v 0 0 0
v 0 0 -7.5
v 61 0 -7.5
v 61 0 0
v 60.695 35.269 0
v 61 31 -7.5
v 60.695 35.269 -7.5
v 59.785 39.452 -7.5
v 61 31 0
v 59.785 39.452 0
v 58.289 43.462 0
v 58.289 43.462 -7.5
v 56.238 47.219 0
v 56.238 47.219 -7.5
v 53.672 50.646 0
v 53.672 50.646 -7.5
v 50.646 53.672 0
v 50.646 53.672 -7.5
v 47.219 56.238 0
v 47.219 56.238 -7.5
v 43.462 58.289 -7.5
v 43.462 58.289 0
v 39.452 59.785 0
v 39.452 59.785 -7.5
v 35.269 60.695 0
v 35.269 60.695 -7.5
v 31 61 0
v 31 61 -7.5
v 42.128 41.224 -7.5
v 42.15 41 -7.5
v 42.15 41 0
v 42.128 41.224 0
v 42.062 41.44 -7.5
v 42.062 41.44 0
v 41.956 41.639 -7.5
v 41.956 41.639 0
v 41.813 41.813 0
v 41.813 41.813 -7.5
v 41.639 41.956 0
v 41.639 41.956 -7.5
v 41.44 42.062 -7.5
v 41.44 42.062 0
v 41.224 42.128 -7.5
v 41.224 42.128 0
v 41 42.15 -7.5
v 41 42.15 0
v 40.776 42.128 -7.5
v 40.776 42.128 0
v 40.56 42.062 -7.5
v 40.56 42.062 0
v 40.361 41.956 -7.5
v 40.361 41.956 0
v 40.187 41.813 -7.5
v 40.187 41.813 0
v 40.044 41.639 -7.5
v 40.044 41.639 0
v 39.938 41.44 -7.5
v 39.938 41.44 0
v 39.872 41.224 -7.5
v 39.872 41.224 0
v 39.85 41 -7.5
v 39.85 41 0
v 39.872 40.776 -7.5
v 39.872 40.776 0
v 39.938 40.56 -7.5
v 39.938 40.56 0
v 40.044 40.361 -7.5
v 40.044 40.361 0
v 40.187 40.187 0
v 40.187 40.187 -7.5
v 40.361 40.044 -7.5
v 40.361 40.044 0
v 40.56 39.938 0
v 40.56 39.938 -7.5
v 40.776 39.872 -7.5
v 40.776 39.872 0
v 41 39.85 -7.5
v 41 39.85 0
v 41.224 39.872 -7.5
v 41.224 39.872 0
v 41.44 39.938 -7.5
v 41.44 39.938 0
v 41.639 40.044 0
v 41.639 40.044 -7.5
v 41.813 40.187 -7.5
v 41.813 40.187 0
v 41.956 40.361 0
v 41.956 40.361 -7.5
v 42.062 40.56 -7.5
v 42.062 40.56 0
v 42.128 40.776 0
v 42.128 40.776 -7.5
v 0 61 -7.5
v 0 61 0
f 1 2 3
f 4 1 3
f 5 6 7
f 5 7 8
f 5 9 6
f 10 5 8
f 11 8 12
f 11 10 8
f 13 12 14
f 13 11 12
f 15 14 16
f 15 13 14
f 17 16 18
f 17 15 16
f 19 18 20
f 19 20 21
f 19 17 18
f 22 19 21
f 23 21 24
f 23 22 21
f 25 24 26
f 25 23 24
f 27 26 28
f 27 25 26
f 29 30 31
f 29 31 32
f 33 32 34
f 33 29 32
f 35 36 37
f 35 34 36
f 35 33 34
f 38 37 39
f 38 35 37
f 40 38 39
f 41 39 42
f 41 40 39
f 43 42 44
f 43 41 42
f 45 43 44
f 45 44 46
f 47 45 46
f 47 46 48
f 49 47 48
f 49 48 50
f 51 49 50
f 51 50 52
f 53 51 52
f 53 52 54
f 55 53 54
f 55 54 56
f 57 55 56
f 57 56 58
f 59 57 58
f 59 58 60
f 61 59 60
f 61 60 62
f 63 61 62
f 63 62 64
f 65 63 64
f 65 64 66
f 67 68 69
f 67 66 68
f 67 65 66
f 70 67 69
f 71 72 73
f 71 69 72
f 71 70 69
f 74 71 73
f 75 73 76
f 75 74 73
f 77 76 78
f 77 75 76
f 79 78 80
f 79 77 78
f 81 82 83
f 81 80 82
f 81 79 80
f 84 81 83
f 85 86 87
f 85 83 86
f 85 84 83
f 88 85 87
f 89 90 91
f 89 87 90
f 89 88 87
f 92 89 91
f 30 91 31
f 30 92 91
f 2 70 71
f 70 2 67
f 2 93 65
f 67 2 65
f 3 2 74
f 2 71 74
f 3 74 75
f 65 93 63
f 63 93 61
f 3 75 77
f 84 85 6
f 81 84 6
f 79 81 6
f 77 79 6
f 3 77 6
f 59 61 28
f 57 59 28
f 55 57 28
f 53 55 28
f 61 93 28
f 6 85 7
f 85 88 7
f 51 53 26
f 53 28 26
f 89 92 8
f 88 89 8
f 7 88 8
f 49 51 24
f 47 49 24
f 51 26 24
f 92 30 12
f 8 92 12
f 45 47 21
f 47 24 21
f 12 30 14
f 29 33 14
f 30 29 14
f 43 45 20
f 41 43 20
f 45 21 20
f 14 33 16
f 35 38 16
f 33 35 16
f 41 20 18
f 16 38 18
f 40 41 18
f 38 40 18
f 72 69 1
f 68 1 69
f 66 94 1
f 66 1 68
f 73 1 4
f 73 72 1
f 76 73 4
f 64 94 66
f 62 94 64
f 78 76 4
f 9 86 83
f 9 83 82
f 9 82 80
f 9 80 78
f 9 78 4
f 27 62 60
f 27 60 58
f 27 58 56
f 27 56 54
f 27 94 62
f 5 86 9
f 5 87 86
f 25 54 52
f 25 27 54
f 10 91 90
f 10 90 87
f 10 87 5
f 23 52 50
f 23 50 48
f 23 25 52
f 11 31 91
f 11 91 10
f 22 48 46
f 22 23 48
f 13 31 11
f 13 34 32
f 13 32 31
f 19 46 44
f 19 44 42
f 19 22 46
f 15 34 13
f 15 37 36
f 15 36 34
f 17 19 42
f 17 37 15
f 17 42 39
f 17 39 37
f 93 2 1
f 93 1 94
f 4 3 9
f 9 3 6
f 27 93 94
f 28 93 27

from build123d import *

# Parameters (mm, degrees)
CYLINDER006_R     = 1.15
CYLINDER006_DEPTH = 40
BOX010_W          = 61
BOX010_H          = 61
BOX010_DEPTH      = 7.5
FILLET002_R       = 30


with BuildPart() as ejerodamientos:
    # Cylinder006 → Cylinder006 (new body)
    with BuildSketch(Plane(origin=(41, 41, -20), x_dir=(1, 0, 0), z_dir=(0, 0, 1))):
        Circle(CYLINDER006_R)
    extrude(amount=CYLINDER006_DEPTH)


with BuildPart() as cut009:
    # Box010 → Box010 (new body)
    with BuildSketch(Plane.XY.offset(-7.5)):
        with Locations((30.5, 30.5)):
            Rectangle(BOX010_W, BOX010_H)
    extrude(amount=BOX010_DEPTH)

    # Fillet002
    fillet002_edges = [cut009.edges().sort_by_distance(p)[0] for p in [
        (61, 61, -3.75),
    ]]
    fillet(fillet002_edges, radius=FILLET002_R)

    # Cut009: cut EjeRodamientos
    add(ejerodamientos.part, mode=Mode.SUBTRACT)


solid = cut009.part
